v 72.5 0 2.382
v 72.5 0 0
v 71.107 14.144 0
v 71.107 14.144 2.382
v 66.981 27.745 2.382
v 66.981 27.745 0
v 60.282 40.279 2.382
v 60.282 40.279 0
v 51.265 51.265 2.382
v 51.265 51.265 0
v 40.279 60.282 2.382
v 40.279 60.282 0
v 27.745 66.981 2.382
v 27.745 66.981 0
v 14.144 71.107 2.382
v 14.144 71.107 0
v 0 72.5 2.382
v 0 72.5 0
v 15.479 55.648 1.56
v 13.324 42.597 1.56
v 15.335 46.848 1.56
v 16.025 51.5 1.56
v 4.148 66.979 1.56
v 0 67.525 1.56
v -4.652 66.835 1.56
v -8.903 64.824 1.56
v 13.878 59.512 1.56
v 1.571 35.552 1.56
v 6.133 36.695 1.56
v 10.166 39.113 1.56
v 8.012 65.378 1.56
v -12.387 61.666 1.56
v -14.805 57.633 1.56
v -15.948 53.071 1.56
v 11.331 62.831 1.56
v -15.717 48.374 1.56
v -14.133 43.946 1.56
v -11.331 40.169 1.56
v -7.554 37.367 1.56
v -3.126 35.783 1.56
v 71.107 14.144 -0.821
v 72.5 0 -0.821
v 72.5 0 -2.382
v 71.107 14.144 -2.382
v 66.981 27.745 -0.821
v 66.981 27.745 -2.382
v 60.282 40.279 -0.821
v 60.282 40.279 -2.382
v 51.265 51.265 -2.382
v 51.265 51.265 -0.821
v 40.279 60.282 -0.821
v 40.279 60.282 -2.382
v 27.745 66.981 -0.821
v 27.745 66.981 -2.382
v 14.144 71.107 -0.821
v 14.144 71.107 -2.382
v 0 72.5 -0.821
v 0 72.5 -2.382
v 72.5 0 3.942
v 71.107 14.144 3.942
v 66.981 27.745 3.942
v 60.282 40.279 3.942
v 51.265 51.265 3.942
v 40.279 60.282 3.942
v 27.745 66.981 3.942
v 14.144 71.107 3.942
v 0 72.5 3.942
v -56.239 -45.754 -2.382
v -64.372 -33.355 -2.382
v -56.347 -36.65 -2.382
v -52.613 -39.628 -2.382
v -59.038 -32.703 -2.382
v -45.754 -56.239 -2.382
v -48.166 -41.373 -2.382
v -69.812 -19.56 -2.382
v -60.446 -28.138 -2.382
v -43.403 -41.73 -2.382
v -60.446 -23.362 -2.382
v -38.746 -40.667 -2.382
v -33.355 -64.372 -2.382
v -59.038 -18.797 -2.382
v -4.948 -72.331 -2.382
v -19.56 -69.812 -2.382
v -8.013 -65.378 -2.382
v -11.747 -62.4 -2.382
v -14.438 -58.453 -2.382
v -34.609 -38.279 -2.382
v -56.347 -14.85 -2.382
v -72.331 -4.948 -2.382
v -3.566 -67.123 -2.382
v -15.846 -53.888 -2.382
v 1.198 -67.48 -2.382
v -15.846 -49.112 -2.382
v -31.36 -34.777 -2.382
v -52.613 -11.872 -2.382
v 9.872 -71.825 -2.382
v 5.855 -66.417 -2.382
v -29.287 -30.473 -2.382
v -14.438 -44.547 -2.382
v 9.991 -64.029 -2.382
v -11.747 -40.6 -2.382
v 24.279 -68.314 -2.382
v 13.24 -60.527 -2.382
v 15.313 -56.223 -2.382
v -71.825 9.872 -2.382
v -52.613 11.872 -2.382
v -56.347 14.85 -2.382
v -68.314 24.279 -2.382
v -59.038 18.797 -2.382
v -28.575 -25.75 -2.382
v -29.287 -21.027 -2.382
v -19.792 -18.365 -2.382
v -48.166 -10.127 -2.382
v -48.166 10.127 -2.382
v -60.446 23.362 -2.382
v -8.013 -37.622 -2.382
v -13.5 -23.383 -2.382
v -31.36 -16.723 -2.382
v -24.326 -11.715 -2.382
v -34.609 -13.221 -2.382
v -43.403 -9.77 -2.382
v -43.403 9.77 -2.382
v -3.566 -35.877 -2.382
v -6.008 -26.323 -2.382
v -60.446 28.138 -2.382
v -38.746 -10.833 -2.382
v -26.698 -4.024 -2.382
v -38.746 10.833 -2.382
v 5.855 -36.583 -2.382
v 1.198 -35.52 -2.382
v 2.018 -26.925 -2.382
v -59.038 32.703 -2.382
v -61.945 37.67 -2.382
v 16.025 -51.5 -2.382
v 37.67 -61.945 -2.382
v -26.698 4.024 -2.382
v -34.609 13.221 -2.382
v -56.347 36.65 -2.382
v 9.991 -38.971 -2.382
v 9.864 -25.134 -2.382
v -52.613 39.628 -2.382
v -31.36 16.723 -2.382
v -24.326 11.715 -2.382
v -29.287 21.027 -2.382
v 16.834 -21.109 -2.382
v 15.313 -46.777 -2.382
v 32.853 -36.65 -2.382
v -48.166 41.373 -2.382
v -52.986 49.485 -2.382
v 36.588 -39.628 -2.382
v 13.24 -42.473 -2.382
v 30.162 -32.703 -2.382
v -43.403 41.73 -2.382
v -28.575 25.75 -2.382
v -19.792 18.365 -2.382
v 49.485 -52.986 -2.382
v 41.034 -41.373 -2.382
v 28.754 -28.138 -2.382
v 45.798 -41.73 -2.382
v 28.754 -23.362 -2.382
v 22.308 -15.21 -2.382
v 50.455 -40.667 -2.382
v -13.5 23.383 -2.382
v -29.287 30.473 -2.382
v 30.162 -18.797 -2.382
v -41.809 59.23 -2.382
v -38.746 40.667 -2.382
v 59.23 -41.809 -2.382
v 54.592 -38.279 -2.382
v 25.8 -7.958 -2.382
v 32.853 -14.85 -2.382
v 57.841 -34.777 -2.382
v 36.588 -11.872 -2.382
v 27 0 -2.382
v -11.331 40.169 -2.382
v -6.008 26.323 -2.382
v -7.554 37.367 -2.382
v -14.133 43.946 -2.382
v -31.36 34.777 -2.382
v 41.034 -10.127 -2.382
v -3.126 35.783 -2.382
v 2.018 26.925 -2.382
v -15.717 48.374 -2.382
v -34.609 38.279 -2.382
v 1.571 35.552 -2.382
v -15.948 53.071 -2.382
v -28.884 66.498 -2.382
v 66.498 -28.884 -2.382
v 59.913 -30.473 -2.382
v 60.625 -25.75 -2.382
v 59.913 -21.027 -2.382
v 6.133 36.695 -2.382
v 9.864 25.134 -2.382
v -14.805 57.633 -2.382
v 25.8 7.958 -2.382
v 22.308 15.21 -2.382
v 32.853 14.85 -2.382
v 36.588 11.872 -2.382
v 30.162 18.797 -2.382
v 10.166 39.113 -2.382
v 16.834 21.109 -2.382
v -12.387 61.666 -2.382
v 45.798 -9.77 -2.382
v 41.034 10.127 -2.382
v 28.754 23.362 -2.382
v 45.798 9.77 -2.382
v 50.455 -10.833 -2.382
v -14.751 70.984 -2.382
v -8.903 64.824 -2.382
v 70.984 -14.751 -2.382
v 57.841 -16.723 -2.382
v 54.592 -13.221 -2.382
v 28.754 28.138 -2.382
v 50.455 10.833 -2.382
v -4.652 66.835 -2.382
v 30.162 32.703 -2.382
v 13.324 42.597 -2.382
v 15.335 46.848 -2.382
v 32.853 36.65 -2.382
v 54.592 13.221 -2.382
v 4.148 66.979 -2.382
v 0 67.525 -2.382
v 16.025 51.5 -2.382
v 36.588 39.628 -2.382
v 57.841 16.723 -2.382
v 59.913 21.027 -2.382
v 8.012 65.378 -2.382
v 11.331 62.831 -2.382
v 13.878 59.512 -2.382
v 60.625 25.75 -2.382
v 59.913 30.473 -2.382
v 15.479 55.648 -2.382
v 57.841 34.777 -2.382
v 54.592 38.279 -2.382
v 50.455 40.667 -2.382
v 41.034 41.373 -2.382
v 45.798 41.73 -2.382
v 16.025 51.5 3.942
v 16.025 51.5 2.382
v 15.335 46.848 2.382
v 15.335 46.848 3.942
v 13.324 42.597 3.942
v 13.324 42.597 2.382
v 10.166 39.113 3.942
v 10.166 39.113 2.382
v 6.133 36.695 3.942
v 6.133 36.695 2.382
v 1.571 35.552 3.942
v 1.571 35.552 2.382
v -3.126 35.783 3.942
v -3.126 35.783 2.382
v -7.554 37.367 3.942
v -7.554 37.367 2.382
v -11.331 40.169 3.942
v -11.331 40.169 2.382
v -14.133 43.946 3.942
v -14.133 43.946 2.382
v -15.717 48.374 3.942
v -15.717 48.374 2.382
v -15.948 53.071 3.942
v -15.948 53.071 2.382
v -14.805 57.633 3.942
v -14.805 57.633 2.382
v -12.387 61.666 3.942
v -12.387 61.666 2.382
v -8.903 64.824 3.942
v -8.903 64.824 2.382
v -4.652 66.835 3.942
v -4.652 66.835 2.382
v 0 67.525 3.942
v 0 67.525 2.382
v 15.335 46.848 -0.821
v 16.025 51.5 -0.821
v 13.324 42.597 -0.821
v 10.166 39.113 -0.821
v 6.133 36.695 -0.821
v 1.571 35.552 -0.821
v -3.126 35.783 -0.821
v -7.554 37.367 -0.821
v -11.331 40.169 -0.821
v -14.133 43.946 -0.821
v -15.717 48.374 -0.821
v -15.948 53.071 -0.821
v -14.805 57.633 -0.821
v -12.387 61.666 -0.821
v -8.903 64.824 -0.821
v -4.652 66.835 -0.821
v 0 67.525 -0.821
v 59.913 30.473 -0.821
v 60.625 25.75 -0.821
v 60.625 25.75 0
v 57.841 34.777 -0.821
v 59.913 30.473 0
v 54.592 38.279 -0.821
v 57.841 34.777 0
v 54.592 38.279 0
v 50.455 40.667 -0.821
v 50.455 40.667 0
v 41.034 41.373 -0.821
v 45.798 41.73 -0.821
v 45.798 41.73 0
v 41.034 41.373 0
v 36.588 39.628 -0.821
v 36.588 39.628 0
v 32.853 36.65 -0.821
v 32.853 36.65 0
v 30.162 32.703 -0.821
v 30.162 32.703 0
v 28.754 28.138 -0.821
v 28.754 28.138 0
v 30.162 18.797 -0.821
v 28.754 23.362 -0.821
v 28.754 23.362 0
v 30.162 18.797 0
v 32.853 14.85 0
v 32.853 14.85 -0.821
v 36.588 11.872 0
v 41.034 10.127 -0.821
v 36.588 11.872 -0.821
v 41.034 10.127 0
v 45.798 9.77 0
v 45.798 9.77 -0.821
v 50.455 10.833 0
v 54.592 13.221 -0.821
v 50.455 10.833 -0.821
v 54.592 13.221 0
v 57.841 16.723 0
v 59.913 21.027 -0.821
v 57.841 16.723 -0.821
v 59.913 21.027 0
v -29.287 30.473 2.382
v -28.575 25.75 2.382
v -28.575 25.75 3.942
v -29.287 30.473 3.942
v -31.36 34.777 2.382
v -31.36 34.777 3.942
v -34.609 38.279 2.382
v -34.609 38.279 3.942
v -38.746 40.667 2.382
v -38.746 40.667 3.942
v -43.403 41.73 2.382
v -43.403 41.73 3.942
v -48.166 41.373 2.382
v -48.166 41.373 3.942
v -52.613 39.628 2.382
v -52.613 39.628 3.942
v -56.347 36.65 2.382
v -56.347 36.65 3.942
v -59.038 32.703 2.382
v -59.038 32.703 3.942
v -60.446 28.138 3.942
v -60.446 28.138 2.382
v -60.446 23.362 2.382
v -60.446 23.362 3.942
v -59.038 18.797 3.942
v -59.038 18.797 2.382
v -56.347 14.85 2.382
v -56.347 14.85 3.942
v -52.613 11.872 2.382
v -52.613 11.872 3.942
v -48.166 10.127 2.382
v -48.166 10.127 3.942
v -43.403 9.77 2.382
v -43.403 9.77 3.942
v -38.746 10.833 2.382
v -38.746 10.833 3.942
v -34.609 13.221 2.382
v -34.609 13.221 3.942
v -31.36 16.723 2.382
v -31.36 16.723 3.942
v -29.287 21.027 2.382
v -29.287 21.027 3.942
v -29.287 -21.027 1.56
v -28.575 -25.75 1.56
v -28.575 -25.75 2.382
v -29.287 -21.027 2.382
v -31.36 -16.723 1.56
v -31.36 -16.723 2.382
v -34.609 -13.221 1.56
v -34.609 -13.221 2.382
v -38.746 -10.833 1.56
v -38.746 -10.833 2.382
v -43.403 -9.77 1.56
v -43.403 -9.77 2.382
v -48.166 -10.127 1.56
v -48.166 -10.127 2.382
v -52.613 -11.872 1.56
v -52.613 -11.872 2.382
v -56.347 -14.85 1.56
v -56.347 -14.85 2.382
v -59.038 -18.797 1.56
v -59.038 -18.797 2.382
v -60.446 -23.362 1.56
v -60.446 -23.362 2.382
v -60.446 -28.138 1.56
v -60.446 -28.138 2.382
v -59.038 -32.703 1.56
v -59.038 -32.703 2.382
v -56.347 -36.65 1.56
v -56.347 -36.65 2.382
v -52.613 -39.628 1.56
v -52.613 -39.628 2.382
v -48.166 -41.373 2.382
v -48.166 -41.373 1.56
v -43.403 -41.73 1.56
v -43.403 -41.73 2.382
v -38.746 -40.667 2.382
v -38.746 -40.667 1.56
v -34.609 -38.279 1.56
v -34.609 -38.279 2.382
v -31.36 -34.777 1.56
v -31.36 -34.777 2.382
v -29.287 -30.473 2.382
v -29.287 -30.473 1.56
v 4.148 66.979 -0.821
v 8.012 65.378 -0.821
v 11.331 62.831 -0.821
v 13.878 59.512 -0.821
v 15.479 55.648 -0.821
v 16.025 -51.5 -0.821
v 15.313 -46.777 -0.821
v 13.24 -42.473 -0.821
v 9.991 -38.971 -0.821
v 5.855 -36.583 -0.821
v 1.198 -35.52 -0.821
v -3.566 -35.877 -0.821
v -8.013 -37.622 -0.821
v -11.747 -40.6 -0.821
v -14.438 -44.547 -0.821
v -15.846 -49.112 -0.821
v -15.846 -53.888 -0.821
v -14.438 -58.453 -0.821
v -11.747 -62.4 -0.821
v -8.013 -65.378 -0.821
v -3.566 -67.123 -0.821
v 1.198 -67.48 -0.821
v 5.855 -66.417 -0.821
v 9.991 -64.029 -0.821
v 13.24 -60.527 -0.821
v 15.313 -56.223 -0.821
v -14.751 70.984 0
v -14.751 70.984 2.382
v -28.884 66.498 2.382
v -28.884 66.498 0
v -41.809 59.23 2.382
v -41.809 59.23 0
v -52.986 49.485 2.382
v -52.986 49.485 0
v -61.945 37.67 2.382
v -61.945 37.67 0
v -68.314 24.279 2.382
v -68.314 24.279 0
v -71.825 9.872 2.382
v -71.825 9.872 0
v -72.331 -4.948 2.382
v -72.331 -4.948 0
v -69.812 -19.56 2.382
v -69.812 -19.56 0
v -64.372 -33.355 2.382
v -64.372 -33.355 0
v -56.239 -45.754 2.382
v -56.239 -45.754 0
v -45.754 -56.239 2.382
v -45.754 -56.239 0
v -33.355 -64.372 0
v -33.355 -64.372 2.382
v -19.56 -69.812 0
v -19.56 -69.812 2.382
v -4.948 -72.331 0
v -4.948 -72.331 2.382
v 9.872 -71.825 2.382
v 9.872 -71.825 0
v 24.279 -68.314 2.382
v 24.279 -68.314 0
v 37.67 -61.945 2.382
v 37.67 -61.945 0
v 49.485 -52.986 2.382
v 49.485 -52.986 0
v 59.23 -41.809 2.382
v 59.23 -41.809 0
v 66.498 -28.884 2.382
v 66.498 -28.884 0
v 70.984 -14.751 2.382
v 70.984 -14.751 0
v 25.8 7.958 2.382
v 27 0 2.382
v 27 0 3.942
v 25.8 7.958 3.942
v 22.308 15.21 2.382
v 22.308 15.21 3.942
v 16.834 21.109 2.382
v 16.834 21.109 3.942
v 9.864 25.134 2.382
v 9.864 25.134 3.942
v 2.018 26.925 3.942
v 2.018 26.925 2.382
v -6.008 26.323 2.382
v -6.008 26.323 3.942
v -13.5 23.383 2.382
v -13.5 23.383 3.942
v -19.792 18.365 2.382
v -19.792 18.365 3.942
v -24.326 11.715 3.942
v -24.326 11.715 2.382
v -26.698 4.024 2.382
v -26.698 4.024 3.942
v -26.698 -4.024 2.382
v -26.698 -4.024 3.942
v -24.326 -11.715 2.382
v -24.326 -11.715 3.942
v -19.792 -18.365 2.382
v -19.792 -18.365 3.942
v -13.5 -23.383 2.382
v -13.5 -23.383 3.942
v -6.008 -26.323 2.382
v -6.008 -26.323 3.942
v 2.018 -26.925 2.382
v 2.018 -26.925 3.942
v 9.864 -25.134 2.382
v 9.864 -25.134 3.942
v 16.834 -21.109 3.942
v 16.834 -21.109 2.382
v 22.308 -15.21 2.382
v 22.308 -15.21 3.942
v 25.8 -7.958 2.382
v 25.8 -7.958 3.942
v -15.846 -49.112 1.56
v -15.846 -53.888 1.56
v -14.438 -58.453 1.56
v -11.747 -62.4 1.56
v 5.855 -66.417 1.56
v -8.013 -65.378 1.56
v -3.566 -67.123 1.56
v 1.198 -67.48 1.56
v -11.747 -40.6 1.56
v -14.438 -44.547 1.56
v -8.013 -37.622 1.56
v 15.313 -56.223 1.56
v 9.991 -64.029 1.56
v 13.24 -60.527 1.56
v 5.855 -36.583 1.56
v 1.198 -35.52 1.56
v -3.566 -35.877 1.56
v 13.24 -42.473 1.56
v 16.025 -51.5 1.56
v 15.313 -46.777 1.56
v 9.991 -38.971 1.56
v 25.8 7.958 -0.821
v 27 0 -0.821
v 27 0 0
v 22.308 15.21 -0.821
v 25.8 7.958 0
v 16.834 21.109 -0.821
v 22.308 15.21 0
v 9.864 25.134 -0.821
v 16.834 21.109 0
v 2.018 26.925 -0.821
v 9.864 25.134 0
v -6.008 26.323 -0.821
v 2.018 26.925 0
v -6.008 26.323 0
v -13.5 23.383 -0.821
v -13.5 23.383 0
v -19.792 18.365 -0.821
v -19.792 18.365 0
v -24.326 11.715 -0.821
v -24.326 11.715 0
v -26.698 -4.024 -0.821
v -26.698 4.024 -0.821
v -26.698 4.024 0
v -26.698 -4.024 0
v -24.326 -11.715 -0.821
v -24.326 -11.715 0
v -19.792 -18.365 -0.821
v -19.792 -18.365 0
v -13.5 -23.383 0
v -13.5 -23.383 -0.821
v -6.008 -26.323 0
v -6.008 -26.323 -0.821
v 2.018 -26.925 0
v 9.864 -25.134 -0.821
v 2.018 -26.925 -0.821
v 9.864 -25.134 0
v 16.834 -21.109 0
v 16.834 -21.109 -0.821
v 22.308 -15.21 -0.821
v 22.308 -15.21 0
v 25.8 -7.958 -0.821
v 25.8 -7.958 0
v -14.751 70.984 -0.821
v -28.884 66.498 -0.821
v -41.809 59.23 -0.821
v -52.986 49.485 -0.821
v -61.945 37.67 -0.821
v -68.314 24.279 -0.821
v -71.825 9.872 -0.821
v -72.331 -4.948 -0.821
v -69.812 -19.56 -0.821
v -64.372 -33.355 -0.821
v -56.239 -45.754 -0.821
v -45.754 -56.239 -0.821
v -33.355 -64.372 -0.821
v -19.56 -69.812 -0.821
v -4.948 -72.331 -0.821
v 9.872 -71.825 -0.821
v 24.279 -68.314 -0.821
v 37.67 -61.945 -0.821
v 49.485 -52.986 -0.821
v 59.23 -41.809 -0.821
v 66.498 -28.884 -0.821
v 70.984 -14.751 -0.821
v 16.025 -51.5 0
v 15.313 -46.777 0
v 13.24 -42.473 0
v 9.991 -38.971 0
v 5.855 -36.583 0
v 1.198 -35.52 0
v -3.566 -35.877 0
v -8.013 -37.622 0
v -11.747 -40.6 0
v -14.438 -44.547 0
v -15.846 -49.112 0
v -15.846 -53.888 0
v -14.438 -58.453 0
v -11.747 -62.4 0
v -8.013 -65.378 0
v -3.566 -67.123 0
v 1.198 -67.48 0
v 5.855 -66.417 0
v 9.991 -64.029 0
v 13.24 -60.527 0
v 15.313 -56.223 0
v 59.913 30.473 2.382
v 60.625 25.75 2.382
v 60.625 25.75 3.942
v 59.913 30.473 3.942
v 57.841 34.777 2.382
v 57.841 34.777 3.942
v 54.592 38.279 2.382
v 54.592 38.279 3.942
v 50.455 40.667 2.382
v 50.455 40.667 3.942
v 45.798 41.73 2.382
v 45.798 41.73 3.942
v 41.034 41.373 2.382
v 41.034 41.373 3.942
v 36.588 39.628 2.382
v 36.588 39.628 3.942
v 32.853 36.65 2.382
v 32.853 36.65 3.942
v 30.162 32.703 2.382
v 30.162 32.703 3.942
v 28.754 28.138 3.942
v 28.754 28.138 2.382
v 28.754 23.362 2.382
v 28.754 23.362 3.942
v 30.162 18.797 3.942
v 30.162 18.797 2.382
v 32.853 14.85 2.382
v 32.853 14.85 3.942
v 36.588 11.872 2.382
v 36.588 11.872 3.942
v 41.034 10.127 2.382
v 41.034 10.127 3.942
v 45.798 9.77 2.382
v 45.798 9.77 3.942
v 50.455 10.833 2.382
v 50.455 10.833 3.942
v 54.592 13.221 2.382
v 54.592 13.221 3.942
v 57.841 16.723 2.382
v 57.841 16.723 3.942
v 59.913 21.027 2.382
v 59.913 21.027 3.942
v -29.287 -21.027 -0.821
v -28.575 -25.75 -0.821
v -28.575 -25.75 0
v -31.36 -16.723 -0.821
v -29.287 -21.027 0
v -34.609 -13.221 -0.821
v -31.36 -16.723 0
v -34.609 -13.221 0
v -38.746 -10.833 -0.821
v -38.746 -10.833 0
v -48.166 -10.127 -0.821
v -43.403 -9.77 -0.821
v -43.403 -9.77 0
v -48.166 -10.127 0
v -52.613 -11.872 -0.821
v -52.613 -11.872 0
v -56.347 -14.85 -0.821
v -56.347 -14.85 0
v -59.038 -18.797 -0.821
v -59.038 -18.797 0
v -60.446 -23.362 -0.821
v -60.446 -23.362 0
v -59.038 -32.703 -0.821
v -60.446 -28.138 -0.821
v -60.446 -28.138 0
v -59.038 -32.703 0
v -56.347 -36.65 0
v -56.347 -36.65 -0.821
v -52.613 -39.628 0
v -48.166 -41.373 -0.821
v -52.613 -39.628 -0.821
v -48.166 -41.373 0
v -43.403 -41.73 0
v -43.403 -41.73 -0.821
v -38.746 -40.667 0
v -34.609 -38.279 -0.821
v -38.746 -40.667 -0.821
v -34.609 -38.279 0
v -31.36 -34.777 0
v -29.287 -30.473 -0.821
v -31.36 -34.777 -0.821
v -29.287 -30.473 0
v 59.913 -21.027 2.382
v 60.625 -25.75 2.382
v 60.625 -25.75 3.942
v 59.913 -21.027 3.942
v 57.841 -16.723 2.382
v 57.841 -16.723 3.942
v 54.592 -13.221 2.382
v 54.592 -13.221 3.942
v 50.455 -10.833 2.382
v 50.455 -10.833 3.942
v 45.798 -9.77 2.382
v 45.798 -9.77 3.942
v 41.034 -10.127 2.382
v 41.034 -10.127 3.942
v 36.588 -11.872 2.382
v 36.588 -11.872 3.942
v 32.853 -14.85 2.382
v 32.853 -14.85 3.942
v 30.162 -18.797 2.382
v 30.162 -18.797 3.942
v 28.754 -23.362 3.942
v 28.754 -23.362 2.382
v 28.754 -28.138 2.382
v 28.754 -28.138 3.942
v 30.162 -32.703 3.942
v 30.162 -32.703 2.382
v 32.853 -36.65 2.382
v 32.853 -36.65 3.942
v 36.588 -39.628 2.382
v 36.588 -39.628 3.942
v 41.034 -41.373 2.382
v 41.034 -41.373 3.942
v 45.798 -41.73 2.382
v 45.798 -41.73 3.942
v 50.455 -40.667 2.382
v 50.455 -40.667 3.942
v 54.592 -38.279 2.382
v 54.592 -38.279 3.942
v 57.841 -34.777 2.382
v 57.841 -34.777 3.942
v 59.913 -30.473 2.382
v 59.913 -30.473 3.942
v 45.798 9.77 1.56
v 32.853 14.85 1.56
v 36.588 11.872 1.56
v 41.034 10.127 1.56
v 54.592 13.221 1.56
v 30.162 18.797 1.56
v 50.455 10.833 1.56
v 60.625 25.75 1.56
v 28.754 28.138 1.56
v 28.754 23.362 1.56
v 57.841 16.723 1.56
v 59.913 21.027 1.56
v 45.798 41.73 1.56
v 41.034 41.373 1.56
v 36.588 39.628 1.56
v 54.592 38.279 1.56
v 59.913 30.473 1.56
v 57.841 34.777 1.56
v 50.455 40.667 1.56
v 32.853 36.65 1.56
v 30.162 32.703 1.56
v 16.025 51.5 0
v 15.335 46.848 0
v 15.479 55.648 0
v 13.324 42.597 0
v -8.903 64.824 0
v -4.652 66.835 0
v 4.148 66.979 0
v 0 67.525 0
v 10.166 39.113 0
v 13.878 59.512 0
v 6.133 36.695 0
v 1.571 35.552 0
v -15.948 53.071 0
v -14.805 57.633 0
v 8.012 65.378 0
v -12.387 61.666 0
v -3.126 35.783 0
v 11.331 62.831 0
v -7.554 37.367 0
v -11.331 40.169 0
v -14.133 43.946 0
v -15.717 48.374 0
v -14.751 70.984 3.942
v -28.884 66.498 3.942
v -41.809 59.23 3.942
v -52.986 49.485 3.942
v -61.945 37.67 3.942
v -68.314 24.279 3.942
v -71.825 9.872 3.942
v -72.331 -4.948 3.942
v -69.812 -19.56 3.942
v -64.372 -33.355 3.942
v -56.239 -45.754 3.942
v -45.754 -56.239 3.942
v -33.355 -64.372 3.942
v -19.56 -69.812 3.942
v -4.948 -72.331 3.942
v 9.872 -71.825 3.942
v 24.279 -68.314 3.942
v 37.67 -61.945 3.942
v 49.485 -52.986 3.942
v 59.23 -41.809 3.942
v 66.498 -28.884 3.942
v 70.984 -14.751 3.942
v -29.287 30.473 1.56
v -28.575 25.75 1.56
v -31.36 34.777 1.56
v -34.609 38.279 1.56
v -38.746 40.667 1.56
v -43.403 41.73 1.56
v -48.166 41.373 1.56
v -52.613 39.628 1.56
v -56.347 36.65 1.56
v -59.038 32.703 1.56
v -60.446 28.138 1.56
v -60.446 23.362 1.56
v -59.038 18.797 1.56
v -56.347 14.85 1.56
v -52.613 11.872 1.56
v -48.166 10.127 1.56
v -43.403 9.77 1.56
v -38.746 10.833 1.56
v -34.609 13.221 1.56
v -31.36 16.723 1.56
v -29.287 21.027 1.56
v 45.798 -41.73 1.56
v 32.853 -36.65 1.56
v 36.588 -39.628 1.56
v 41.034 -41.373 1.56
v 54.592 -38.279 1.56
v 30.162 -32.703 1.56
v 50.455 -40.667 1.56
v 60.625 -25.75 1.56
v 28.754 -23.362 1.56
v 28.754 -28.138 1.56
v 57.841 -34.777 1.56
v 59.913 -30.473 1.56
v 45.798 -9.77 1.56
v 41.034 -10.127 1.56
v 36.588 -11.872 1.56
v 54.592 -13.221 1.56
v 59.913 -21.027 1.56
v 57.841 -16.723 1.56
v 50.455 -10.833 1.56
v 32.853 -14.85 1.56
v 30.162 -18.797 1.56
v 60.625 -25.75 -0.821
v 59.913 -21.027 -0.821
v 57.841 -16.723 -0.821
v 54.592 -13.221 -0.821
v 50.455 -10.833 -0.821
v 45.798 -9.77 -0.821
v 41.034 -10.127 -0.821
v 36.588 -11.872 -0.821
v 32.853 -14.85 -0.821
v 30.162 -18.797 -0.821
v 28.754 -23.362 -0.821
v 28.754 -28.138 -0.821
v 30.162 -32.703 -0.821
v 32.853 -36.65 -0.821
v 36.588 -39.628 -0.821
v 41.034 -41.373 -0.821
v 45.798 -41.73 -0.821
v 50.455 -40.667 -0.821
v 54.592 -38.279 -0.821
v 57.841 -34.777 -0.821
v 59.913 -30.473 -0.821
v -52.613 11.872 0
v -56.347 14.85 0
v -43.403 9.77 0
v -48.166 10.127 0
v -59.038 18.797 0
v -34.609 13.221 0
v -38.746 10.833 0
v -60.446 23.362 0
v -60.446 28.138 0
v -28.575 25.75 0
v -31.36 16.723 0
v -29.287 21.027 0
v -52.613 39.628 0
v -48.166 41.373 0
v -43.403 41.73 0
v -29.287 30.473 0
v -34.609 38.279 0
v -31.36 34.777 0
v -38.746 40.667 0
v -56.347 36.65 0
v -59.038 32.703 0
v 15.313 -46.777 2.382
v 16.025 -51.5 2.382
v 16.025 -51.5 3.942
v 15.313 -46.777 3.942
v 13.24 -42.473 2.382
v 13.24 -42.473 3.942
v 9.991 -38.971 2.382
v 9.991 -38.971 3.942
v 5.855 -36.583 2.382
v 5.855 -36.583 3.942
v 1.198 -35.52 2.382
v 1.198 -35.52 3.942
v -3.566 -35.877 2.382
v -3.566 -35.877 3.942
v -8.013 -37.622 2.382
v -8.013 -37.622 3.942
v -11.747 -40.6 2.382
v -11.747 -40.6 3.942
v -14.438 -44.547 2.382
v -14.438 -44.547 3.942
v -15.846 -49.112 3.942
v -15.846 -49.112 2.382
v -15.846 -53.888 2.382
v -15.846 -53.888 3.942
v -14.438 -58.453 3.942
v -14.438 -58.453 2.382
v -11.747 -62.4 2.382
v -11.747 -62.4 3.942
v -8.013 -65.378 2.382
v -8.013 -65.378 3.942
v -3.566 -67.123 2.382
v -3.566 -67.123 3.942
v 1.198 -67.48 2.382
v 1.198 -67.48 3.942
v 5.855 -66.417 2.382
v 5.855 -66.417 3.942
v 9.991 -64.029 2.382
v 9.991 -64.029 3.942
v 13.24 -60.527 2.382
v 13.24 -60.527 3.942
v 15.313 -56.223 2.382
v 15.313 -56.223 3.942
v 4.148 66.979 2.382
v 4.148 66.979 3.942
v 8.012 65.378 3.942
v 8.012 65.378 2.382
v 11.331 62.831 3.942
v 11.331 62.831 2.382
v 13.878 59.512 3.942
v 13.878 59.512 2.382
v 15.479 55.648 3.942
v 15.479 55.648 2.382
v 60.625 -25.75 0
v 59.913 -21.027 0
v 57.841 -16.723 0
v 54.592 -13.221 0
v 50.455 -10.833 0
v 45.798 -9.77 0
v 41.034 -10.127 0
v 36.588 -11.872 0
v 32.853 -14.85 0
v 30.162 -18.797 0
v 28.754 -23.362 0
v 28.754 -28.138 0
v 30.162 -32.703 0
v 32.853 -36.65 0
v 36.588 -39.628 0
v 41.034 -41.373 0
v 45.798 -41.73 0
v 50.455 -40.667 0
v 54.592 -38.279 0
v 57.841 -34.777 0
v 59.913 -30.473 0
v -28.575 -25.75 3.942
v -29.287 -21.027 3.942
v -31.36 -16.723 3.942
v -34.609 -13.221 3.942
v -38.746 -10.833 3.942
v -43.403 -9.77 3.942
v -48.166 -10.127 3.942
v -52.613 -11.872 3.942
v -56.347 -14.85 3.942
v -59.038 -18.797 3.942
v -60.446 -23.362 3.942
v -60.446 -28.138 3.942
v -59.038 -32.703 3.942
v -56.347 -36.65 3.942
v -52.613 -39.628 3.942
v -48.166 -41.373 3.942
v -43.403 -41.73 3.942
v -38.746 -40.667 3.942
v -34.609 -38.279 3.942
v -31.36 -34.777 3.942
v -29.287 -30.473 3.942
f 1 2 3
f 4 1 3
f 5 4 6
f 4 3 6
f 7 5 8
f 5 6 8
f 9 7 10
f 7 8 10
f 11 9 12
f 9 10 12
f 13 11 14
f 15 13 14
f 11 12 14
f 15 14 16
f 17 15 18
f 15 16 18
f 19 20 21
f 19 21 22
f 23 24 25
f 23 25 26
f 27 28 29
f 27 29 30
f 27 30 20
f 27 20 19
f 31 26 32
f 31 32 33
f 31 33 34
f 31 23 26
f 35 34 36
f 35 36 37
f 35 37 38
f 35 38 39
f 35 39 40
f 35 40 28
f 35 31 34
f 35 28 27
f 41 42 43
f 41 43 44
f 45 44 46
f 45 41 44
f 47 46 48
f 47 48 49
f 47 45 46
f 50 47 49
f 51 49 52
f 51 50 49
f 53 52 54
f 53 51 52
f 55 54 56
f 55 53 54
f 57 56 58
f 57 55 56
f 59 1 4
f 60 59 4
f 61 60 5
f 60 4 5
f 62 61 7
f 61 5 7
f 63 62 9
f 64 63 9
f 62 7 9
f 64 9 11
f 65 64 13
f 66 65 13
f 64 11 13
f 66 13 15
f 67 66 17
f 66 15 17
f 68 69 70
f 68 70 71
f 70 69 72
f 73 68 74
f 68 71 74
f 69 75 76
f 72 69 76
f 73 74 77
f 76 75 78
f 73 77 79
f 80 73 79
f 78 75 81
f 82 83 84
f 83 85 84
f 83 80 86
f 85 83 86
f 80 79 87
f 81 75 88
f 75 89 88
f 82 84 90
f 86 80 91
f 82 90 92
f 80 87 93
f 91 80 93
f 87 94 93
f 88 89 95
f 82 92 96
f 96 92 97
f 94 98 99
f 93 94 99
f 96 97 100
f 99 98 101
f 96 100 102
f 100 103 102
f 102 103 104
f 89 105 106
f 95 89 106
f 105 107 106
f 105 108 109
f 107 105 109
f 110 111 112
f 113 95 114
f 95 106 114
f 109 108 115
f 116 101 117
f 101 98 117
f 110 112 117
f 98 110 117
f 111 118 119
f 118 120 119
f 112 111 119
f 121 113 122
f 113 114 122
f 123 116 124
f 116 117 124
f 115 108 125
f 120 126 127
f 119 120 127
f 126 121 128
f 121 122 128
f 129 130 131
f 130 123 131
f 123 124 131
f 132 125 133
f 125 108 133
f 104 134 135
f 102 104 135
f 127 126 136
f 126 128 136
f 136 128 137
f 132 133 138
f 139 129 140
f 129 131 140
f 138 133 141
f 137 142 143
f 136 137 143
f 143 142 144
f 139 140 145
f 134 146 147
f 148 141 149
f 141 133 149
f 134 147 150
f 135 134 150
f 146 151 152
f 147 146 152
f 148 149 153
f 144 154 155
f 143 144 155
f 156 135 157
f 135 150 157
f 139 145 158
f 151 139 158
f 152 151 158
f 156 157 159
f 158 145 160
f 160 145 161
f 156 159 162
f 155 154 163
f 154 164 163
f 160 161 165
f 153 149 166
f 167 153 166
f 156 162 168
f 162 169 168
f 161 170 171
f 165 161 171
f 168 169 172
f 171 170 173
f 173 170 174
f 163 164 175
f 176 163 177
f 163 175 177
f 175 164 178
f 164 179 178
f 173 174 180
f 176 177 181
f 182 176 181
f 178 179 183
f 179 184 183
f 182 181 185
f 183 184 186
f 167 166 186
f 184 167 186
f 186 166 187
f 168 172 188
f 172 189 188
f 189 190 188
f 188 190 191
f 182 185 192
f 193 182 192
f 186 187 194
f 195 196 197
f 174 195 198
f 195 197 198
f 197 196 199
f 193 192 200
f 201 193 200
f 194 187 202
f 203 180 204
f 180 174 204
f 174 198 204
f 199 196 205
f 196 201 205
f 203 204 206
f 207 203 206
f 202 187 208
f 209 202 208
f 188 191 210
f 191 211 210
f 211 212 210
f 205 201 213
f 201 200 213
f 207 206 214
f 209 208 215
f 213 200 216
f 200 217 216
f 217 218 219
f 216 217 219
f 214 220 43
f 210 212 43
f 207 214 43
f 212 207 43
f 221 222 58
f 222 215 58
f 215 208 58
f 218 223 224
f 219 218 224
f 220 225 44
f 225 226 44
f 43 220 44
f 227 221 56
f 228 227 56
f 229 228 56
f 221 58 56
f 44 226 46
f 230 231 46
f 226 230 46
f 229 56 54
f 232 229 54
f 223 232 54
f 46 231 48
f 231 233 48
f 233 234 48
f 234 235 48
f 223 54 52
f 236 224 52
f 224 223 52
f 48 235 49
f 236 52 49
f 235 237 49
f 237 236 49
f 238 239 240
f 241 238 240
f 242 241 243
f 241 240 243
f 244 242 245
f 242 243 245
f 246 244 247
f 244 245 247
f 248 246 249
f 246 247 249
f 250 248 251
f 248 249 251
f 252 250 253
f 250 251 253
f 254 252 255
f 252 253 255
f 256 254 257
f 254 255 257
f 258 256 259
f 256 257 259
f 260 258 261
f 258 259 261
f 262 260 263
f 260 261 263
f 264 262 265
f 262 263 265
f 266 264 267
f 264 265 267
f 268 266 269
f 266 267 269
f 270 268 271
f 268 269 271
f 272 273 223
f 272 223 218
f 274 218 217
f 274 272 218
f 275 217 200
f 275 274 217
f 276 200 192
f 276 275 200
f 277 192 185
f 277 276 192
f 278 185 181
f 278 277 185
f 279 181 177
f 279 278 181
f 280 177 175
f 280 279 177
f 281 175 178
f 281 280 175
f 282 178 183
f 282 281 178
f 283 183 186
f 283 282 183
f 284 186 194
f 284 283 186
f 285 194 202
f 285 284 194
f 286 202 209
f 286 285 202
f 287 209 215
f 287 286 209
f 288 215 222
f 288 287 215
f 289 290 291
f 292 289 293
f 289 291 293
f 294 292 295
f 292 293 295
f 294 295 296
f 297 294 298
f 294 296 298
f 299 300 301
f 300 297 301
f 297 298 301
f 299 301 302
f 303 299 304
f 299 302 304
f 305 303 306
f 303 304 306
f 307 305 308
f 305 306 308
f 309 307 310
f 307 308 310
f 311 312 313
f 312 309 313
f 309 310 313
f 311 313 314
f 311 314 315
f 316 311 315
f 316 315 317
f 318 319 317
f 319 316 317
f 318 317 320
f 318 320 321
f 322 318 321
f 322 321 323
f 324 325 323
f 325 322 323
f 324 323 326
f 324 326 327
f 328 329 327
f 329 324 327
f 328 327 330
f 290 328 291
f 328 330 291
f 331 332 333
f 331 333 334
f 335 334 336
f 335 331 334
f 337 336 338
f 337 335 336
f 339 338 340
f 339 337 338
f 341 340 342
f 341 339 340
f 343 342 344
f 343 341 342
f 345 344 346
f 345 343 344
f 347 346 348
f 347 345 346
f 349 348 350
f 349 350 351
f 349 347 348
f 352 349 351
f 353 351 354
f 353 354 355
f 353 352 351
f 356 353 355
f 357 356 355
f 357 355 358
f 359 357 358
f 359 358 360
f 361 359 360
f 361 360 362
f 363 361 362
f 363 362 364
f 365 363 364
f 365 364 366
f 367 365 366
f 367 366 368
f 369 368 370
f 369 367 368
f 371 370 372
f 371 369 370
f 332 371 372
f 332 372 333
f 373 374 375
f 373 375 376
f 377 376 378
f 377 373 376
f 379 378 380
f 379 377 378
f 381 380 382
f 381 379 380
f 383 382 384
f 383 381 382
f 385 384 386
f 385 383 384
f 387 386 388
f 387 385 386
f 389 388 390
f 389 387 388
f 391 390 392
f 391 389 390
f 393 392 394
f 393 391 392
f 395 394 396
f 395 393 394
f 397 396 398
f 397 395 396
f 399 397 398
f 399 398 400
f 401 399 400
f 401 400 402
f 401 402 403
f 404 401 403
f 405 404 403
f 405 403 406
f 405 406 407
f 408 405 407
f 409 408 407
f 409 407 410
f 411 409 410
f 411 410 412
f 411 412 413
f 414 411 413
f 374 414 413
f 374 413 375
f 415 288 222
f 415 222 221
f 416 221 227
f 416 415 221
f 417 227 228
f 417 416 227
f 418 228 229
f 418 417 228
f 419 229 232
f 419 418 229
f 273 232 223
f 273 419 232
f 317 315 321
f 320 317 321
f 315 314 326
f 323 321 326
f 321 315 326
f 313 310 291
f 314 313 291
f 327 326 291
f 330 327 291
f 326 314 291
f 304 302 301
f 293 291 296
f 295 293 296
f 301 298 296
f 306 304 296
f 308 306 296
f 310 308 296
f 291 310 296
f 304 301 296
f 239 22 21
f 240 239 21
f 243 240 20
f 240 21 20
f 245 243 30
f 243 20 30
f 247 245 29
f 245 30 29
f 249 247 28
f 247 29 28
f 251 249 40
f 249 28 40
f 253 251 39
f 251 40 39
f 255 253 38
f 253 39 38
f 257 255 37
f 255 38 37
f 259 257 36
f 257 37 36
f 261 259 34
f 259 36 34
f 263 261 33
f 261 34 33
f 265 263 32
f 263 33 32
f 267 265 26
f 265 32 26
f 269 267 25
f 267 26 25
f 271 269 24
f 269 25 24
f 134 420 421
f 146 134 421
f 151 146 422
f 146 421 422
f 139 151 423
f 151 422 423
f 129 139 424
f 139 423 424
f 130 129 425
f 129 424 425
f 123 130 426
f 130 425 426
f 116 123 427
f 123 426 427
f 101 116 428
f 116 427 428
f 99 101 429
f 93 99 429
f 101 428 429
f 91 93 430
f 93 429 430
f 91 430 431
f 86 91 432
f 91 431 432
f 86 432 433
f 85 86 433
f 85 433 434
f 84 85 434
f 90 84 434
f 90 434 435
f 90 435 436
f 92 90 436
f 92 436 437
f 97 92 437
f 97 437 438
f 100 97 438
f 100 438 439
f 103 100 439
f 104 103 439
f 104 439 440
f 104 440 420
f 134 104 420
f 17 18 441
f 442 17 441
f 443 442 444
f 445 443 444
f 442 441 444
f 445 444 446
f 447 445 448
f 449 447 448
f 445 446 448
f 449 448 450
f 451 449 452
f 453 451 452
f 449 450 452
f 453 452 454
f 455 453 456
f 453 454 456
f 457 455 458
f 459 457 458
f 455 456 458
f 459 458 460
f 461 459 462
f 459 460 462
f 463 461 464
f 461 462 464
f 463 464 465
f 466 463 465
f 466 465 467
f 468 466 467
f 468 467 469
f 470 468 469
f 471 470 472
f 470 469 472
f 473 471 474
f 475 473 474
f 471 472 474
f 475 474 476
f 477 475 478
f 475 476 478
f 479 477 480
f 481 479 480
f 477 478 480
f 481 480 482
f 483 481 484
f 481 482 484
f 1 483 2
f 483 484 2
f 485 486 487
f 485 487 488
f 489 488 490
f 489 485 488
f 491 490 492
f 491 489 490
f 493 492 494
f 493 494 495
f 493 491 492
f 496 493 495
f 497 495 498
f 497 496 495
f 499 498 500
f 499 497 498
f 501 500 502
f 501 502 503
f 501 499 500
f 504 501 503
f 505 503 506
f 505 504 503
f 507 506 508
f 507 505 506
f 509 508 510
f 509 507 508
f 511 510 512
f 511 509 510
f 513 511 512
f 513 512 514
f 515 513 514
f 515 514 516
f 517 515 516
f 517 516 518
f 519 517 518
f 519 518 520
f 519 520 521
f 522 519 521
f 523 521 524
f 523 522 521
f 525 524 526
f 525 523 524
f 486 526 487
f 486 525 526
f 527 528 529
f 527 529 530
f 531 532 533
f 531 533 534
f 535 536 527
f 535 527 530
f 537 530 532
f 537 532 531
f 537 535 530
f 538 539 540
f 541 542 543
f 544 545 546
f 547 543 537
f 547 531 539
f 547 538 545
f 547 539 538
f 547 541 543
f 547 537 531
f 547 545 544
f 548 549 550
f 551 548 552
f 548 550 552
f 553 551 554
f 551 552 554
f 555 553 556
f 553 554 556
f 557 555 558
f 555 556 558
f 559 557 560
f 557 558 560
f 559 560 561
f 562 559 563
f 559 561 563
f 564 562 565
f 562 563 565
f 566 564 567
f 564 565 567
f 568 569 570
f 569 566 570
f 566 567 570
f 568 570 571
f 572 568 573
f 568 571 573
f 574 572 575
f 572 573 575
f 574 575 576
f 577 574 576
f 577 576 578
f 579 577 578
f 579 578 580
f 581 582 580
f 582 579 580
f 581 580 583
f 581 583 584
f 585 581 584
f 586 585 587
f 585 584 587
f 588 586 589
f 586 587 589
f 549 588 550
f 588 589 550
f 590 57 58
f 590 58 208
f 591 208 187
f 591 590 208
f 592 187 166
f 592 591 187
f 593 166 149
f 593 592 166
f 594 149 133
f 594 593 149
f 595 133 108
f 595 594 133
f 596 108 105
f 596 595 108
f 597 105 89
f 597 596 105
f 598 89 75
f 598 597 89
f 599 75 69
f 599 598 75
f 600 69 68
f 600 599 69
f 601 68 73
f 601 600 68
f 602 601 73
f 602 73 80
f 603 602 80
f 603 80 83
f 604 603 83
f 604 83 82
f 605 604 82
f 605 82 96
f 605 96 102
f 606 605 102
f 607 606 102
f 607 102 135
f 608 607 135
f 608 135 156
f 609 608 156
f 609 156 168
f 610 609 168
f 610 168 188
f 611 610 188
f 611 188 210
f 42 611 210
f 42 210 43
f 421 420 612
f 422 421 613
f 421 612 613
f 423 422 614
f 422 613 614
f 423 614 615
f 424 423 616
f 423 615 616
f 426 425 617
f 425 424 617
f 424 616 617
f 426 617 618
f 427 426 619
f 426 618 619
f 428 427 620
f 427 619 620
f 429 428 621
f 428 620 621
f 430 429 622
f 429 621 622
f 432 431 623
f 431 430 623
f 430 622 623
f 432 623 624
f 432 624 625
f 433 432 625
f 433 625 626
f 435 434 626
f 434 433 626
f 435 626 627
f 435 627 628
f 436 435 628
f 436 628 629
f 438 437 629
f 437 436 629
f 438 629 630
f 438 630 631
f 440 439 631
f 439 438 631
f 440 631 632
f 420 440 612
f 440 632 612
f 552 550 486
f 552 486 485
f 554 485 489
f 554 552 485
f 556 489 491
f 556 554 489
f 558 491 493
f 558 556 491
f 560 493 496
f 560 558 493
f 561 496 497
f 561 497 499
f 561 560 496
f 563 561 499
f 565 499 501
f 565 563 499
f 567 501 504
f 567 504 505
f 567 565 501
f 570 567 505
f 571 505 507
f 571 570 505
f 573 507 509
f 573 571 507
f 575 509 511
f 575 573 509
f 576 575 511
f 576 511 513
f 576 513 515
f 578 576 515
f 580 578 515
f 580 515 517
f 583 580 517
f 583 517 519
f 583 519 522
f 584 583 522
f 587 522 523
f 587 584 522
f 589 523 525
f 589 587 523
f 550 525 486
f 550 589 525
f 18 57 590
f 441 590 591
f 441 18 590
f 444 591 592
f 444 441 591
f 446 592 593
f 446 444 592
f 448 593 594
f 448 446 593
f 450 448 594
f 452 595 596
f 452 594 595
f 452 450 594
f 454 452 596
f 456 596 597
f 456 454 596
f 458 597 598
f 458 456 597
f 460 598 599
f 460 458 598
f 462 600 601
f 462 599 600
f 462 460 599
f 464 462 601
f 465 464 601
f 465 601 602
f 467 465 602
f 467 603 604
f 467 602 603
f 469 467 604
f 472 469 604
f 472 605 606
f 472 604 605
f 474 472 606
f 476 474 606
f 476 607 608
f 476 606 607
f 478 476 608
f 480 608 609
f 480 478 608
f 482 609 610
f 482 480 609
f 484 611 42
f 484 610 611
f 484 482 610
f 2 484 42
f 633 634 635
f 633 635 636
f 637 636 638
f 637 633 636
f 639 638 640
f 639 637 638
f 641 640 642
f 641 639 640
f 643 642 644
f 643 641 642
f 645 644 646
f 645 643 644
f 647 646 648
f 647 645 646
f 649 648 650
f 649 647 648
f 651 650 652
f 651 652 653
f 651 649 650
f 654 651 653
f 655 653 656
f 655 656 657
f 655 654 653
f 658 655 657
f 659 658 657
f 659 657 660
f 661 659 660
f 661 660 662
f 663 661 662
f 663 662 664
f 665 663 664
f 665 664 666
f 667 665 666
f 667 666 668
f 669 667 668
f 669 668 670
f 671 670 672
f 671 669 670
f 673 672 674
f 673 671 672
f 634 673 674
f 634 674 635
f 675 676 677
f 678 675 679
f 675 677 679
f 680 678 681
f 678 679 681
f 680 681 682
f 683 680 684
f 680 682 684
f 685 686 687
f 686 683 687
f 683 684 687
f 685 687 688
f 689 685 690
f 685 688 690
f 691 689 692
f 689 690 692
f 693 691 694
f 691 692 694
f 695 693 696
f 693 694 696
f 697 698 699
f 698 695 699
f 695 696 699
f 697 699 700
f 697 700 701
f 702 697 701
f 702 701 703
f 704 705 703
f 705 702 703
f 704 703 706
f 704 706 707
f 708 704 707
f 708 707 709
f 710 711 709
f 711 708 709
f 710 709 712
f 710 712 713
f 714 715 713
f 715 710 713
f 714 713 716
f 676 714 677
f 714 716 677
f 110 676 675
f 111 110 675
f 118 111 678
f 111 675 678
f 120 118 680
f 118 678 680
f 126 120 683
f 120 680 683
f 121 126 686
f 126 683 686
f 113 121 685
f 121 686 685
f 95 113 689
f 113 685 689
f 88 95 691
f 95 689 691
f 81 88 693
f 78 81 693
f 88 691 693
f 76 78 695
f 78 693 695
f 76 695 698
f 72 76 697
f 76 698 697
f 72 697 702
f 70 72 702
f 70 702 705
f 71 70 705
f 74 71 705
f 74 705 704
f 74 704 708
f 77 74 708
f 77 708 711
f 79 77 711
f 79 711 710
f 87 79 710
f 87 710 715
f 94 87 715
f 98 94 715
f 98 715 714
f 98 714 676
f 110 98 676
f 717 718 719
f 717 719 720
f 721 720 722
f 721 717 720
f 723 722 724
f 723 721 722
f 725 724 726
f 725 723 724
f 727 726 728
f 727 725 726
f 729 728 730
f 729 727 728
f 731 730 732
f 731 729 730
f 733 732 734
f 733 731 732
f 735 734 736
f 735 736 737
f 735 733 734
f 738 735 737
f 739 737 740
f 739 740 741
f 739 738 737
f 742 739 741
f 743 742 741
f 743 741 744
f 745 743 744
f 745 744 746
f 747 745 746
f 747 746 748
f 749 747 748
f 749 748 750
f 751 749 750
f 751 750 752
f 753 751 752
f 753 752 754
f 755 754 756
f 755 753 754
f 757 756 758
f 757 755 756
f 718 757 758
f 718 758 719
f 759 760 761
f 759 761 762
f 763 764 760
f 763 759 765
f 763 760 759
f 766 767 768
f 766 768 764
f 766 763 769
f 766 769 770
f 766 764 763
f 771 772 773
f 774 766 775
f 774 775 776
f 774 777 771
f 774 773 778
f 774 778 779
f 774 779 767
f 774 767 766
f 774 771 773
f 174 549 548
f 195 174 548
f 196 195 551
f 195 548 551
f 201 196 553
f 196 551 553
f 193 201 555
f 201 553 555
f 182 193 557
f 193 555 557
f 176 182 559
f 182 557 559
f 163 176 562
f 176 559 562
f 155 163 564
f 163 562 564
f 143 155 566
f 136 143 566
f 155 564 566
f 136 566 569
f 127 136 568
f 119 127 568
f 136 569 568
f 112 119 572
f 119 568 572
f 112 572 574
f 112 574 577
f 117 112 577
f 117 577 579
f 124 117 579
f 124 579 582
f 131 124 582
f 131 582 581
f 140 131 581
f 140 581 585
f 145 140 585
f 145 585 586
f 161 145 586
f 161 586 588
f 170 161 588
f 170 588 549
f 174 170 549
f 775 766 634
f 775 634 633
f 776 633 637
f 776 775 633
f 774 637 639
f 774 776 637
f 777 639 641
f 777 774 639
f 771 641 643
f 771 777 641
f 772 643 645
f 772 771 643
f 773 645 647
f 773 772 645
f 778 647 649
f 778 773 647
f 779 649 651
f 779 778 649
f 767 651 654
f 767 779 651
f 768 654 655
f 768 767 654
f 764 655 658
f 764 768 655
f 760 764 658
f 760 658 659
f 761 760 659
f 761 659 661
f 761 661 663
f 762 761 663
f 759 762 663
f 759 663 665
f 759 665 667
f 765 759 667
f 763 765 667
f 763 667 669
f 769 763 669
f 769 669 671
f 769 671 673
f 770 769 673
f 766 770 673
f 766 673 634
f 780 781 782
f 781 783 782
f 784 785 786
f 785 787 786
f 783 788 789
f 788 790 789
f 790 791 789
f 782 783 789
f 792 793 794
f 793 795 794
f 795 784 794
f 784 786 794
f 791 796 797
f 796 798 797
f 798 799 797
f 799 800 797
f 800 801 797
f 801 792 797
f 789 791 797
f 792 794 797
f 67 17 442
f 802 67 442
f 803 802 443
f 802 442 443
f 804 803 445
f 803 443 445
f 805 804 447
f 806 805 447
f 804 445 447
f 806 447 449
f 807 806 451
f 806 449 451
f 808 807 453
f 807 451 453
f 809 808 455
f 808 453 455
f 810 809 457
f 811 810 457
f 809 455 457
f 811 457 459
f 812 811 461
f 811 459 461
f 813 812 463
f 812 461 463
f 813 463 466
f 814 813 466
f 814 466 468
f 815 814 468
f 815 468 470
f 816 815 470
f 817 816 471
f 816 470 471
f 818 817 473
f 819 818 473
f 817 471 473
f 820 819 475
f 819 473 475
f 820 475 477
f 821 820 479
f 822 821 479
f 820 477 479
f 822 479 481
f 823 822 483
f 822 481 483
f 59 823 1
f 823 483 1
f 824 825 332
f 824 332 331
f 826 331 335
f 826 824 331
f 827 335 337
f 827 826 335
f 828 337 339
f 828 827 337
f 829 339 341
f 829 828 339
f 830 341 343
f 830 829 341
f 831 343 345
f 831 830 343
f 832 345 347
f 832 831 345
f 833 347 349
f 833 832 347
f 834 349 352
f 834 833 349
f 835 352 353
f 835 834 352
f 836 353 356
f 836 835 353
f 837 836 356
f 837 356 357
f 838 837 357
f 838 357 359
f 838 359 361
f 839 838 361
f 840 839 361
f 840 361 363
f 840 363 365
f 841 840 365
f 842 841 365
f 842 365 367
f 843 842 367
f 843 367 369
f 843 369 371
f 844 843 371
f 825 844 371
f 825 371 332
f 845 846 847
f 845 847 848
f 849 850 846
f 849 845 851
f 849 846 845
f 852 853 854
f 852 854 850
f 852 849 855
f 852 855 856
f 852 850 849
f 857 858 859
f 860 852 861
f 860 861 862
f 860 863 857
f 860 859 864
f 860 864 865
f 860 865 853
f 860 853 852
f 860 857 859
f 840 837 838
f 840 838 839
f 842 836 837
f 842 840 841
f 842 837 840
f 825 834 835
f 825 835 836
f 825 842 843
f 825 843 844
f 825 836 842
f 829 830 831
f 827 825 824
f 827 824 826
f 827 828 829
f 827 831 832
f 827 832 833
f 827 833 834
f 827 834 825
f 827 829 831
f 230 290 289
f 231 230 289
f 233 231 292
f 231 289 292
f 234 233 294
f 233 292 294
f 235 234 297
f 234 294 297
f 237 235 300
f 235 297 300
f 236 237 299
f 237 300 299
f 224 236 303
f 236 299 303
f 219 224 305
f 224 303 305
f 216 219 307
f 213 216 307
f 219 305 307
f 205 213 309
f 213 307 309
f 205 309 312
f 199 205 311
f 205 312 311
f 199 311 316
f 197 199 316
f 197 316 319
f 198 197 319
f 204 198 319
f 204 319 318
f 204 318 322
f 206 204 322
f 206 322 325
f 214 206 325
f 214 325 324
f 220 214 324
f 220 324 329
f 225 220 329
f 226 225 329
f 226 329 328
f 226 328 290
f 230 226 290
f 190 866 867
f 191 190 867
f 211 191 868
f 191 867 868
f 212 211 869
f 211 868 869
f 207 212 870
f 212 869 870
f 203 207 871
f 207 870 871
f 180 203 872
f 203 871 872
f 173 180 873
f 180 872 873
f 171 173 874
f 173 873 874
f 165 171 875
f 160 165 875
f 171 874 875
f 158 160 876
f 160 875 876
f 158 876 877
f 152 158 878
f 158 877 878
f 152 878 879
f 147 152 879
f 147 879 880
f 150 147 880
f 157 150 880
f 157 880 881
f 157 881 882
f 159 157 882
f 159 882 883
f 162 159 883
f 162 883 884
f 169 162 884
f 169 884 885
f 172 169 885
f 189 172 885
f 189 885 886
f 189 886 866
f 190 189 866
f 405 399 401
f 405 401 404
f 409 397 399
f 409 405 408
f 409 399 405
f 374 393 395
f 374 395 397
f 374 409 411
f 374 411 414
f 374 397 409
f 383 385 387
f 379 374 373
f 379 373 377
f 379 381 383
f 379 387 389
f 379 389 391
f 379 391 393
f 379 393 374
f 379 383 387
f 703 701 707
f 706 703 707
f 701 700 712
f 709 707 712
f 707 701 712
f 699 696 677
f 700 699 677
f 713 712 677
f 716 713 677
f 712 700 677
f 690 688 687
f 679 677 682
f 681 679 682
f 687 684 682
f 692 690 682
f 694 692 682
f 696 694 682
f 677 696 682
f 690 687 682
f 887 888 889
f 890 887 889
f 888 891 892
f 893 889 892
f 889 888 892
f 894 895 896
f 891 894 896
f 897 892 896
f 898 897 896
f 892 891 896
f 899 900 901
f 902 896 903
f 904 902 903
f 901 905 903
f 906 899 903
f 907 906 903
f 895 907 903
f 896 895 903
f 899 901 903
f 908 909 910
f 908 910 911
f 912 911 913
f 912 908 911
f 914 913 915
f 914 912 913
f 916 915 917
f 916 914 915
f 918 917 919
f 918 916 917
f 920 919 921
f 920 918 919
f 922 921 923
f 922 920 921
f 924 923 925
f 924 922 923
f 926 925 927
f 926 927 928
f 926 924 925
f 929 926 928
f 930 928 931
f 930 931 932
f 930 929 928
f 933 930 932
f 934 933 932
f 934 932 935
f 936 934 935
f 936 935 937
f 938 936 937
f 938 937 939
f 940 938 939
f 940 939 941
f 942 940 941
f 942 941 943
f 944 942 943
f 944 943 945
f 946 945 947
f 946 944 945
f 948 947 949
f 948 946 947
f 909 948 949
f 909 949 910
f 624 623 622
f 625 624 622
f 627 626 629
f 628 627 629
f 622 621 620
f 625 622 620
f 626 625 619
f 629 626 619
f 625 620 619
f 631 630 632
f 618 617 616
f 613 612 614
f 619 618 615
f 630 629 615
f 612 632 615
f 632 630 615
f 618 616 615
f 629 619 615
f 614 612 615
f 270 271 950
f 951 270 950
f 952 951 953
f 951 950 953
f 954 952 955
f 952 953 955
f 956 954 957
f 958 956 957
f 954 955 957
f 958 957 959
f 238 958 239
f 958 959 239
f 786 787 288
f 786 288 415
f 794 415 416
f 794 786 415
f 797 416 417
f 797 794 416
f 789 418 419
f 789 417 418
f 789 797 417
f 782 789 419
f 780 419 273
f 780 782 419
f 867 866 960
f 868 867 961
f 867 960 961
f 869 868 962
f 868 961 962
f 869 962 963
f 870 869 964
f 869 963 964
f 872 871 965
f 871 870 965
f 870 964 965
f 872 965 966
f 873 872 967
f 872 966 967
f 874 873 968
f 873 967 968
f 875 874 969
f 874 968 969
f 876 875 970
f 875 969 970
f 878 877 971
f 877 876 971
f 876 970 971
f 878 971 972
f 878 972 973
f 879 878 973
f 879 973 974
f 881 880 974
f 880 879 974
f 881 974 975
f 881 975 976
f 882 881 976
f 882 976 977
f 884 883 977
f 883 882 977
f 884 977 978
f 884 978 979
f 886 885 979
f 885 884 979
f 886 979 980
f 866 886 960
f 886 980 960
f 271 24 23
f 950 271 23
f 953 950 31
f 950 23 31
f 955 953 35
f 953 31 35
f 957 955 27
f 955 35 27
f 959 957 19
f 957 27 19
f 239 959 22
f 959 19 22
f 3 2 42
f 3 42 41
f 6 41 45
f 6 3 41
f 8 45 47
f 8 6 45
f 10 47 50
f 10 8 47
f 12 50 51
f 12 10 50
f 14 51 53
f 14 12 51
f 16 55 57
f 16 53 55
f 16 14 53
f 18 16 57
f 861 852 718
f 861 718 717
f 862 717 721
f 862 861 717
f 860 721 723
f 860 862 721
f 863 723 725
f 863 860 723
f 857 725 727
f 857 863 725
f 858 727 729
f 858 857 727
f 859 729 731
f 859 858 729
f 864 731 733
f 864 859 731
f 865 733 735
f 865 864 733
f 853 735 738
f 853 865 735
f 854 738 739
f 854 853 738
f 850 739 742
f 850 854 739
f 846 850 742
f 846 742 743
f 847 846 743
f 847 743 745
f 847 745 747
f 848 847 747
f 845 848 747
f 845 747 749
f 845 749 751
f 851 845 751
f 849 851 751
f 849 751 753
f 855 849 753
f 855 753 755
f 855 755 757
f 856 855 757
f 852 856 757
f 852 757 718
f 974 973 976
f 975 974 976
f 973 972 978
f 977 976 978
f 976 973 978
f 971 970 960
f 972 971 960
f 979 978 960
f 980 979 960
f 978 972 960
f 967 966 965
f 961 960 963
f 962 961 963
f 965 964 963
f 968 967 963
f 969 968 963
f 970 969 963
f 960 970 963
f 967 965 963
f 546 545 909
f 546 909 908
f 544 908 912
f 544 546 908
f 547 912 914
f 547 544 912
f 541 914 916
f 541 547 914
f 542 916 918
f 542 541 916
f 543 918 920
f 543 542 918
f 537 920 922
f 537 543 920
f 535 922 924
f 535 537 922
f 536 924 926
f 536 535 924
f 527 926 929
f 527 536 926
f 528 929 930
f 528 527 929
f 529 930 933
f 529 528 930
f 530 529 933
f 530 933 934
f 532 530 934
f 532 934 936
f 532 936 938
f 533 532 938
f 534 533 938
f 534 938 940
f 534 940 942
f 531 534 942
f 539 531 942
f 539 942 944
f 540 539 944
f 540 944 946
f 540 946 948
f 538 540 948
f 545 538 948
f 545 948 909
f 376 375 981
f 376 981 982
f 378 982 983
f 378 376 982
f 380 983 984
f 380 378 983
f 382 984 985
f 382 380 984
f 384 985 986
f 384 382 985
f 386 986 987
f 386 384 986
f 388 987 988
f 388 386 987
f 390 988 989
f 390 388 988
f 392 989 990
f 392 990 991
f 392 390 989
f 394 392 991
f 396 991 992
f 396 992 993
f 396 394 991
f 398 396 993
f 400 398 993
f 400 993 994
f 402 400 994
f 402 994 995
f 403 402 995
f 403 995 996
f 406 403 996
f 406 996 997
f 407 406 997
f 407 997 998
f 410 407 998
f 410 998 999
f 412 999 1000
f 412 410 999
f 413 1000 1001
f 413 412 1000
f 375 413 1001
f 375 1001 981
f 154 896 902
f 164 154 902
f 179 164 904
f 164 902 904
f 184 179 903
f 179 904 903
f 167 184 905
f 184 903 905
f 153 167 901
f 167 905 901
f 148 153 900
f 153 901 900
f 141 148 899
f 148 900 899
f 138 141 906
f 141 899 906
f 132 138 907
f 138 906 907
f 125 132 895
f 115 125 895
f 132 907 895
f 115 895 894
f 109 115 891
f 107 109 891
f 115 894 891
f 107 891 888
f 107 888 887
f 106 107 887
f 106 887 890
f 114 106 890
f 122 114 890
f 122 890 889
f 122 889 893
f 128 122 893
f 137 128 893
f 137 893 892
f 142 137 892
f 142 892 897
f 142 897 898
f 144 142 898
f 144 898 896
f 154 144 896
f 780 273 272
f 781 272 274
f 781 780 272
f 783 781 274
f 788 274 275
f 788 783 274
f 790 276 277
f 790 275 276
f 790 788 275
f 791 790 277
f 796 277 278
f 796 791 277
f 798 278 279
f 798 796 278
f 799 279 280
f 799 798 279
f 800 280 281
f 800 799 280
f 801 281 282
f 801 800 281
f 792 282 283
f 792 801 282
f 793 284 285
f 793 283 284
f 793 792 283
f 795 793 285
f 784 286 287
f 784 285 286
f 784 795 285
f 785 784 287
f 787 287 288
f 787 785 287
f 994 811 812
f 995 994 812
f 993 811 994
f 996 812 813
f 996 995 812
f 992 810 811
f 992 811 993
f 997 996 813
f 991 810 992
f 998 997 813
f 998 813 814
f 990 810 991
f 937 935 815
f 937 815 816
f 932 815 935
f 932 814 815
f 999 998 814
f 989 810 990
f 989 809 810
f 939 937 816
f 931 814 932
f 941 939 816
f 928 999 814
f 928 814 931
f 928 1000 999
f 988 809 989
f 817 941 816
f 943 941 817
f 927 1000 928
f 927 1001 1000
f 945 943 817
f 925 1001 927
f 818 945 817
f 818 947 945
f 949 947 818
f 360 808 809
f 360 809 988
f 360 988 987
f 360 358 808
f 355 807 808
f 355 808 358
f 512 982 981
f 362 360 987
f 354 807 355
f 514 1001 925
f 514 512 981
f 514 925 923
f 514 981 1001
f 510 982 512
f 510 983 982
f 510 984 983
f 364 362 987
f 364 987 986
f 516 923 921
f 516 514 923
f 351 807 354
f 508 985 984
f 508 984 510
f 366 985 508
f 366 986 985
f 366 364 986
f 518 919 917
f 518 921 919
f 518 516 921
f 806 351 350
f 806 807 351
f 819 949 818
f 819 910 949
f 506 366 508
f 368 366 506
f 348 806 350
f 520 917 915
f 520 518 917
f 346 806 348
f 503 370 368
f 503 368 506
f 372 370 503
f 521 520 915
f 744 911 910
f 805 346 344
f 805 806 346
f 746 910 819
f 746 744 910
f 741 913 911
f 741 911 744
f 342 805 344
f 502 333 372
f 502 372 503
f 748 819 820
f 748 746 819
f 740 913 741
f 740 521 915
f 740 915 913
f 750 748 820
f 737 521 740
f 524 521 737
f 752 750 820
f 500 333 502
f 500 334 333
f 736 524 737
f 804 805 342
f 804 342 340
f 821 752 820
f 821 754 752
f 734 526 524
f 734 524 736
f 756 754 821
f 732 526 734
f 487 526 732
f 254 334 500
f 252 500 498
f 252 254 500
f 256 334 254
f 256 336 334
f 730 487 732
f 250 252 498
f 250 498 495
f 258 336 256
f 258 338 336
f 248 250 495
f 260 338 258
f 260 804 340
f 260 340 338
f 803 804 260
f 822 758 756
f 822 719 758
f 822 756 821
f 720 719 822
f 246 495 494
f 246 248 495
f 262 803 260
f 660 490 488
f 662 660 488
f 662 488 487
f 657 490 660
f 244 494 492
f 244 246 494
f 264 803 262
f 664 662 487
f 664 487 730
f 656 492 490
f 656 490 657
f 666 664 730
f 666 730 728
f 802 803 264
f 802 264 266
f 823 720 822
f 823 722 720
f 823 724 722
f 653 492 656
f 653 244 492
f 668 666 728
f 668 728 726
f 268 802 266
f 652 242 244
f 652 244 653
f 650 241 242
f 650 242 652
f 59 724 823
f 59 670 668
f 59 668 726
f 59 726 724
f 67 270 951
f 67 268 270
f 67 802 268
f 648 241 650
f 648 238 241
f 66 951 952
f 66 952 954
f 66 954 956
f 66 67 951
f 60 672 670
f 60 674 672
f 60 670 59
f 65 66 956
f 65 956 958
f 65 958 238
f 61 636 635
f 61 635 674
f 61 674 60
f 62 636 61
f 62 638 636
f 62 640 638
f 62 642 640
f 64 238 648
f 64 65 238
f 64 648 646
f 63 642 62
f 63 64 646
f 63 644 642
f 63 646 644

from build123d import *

# Parameters (mm, degrees)
F0_R         = 16.025
F0_R_2       = 27
F1_DEPTH     = 2.3815
F1_FACE_R    = 16.025
F1_FACE_R_2  = 27
F1_FACE1_R   = 16.025
F1_FACE1_R_2 = 27
F2_DEPTH     = 1.56


with BuildPart() as f1:
    # F0 (on Top) → F1 (new body, symmetric)
    with BuildSketch(Plane.XY):
        with BuildLine():
            ThreePointArc((0, 72.5), (-51.265241636, -51.265241636), (72.5, 0))
            ThreePointArc((72.5, 0), (51.265241636, 51.265241636), (0, 72.5))
        make_face()
        with Locations((-44.6003082949, -25.75)):
            Circle(F0_R, mode=Mode.SUBTRACT)
        with Locations((0, -51.5)):
            Circle(F0_R, mode=Mode.SUBTRACT)
        with Locations((44.6003082949, -25.75)):
            Circle(F0_R, mode=Mode.SUBTRACT)
        with Locations((-44.6003082949, 25.75)):
            Circle(F0_R, mode=Mode.SUBTRACT)
        Circle(F0_R_2, mode=Mode.SUBTRACT)
        with Locations((44.6003082949, 25.75)):
            Circle(F0_R, mode=Mode.SUBTRACT)
        with BuildLine():
            ThreePointArc((16.025, 51.5), (-11.3313861685, 40.1686138315), (0, 67.525))
            ThreePointArc((0, 67.525), (11.3313861685, 62.8313861685), (16.025, 51.5))
        make_face(mode=Mode.SUBTRACT)
    extrude(amount=F1_DEPTH, both=True)

    # F0 (on Top) + F1_face (on face) + F1_face1 (on face) → F2 (join)
    with BuildSketch(Plane.XY):
        with Locations((-44.6003082949, 25.75)):
            Circle(F0_R)
        with BuildLine():
            ThreePointArc((16.025, 51.5), (11.3313861685, 62.8313861685), (0, 67.525))
            ThreePointArc((0, 67.525), (-11.3313861685, 40.1686138315), (16.025, 51.5))
        make_face()
        with Locations((44.6003082949, 25.75)):
            Circle(F0_R)
        with Locations((44.6003082949, -25.75)):
            Circle(F0_R)
        with Locations((0, -51.5)):
            Circle(F0_R)
        with Locations((-44.6003082949, -25.75)):
            Circle(F0_R)
    with BuildSketch(Plane.XY.offset(2.3815)):
        with BuildLine():
            ThreePointArc((72.5, 0), (51.265241636, 51.265241636), (0, 72.5))
            ThreePointArc((0, 72.5), (-51.265241636, -51.265241636), (72.5, 0))
        make_face()
        with Locations((-44.6003082949, -25.75)):
            Circle(F1_FACE_R, mode=Mode.SUBTRACT)
        with Locations((0, -51.5)):
            Circle(F1_FACE_R, mode=Mode.SUBTRACT)
        with Locations((44.6003082949, -25.75)):
            Circle(F1_FACE_R, mode=Mode.SUBTRACT)
        with Locations((-44.6003082949, 25.75)):
            Circle(F1_FACE_R, mode=Mode.SUBTRACT)
        Circle(F1_FACE_R_2, mode=Mode.SUBTRACT)
        with Locations((44.6003082949, 25.75)):
            Circle(F1_FACE_R, mode=Mode.SUBTRACT)
        with BuildLine():
            ThreePointArc((16.025, 51.5), (-11.3313861685, 40.1686138315), (0, 67.525))
            ThreePointArc((0, 67.525), (11.3313861685, 62.8313861685), (16.025, 51.5))
        make_face(mode=Mode.SUBTRACT)
    with BuildSketch(Plane(origin=(0, 0, -2.3815), x_dir=(1, 0, 0), z_dir=(0, 0, -1))):
        with BuildLine():
            ThreePointArc((0, -72.5), (51.265241636, -51.265241636), (72.5, 0))
            ThreePointArc((72.5, 0), (-51.265241636, 51.265241636), (0, -72.5))
        make_face()
        with Locations((-44.6003082949, 25.75)):
            Circle(F1_FACE1_R, mode=Mode.SUBTRACT)
        with Locations((0, 51.5)):
            Circle(F1_FACE1_R, mode=Mode.SUBTRACT)
        with Locations((44.6003082949, 25.75)):
            Circle(F1_FACE1_R, mode=Mode.SUBTRACT)
        with Locations((-44.6003082949, -25.75)):
            Circle(F1_FACE1_R, mode=Mode.SUBTRACT)
        Circle(F1_FACE1_R_2, mode=Mode.SUBTRACT)
        with Locations((44.6003082949, -25.75)):
            Circle(F1_FACE1_R, mode=Mode.SUBTRACT)
        with BuildLine():
            ThreePointArc((0, -67.525), (-11.3313861685, -40.1686138315), (16.025, -51.5))
            ThreePointArc((16.025, -51.5), (11.3313861685, -62.8313861685), (0, -67.525))
        make_face(mode=Mode.SUBTRACT)
    extrude(amount=F2_DEPTH, dir=(0, 0, 1))


solid = f1.part
